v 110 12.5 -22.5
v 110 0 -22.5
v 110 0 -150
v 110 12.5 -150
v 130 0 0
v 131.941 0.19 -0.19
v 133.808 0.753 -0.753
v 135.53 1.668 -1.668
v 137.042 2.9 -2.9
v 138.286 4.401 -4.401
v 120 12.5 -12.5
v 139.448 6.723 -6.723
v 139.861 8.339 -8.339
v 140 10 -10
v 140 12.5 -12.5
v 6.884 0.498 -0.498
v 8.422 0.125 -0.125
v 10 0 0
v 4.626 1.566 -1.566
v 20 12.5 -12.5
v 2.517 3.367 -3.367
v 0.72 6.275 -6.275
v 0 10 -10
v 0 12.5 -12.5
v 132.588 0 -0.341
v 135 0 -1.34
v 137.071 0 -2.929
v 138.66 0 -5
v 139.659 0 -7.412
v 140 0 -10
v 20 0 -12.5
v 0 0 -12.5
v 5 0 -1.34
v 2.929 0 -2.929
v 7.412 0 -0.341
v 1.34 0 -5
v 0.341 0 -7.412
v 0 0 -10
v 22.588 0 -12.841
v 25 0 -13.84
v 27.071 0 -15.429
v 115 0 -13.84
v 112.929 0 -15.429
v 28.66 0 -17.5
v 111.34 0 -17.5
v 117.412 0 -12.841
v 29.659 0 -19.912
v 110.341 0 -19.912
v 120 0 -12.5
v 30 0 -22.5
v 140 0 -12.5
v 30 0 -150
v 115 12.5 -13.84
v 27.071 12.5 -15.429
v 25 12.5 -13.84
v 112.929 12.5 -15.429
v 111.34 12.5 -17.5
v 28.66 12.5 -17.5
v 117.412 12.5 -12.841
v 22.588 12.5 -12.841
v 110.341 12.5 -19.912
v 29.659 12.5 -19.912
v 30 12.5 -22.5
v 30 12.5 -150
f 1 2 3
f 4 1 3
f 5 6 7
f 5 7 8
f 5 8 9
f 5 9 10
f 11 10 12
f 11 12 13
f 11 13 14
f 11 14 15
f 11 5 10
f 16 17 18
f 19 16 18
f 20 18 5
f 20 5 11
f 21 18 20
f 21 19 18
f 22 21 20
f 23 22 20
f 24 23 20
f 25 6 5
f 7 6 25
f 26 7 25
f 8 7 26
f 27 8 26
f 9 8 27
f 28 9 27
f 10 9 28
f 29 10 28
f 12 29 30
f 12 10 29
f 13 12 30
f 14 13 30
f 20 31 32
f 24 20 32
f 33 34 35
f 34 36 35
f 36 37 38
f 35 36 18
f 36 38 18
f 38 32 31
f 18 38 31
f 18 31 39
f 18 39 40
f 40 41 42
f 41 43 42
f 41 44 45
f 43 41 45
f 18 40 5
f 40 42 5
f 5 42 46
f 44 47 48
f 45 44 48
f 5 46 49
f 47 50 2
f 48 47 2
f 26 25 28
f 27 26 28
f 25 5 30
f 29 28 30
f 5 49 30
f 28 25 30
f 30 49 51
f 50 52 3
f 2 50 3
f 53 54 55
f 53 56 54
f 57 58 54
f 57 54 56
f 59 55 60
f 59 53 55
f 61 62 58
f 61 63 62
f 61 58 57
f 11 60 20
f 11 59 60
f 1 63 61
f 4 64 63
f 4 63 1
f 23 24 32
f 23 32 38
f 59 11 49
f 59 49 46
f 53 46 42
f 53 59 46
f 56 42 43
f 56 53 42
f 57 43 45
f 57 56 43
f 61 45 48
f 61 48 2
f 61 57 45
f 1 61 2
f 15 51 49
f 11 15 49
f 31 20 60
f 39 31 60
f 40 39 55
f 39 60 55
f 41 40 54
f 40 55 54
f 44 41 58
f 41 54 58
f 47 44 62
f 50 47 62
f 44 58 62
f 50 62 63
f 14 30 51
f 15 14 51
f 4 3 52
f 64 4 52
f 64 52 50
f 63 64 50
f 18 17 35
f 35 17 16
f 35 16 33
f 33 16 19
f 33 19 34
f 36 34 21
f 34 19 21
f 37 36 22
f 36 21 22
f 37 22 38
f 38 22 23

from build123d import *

# Parameters (mm, degrees)
BOSS_EXTRUDE1_DEPTH     = 12.5
FILLET1_R               = 10
CUT_EXTRUDE1_DEPTH      = 206.563250607
CUT_EXTRUDE1_DEPTH_BACK = 206.563250607
FILLET5_R               = 10


with BuildPart() as part:
    # Sketch1 → Boss-Extrude1 (new body)
    with BuildSketch(Plane(origin=(0, 0, 0), x_dir=(1, 0, 0), z_dir=(0, 1, 0))):
        Polygon((0, 0), (140, 0), (140, 12.5), (110, 12.5), (110, 150), (30, 150), (30, 12.5), (0, 12.5), align=None)
    extrude(amount=BOSS_EXTRUDE1_DEPTH)

    # Fillet1
    fillet1_edges = [part.edges().sort_by_distance(p)[0] for p in [
        (140, 6.25, 0),
        (0, 6.25, 0),
    ]]
    fillet(fillet1_edges, radius=FILLET1_R)

    # Sketch3 → Cut-Extrude1 (cut, two sides: drawn at the far end of the back side and taken through both)
    with BuildSketch(Plane(origin=(0, 0, 0), x_dir=(0, 0, -1), z_dir=(1, 0, 0)).offset(-CUT_EXTRUDE1_DEPTH_BACK)):
        Polygon((0, 0), (12.5, 12.5), (0, 12.5), align=None)
    extrude(amount=CUT_EXTRUDE1_DEPTH + CUT_EXTRUDE1_DEPTH_BACK, mode=Mode.SUBTRACT)

    # Fillet5
    fillet5_edges = [part.edges().sort_by_distance(p)[0] for p in [
        (30, 6.25, -12.5),
        (110, 6.25, -12.5),
    ]]
    fillet(fillet5_edges, radius=FILLET5_R)


solid = part.part
